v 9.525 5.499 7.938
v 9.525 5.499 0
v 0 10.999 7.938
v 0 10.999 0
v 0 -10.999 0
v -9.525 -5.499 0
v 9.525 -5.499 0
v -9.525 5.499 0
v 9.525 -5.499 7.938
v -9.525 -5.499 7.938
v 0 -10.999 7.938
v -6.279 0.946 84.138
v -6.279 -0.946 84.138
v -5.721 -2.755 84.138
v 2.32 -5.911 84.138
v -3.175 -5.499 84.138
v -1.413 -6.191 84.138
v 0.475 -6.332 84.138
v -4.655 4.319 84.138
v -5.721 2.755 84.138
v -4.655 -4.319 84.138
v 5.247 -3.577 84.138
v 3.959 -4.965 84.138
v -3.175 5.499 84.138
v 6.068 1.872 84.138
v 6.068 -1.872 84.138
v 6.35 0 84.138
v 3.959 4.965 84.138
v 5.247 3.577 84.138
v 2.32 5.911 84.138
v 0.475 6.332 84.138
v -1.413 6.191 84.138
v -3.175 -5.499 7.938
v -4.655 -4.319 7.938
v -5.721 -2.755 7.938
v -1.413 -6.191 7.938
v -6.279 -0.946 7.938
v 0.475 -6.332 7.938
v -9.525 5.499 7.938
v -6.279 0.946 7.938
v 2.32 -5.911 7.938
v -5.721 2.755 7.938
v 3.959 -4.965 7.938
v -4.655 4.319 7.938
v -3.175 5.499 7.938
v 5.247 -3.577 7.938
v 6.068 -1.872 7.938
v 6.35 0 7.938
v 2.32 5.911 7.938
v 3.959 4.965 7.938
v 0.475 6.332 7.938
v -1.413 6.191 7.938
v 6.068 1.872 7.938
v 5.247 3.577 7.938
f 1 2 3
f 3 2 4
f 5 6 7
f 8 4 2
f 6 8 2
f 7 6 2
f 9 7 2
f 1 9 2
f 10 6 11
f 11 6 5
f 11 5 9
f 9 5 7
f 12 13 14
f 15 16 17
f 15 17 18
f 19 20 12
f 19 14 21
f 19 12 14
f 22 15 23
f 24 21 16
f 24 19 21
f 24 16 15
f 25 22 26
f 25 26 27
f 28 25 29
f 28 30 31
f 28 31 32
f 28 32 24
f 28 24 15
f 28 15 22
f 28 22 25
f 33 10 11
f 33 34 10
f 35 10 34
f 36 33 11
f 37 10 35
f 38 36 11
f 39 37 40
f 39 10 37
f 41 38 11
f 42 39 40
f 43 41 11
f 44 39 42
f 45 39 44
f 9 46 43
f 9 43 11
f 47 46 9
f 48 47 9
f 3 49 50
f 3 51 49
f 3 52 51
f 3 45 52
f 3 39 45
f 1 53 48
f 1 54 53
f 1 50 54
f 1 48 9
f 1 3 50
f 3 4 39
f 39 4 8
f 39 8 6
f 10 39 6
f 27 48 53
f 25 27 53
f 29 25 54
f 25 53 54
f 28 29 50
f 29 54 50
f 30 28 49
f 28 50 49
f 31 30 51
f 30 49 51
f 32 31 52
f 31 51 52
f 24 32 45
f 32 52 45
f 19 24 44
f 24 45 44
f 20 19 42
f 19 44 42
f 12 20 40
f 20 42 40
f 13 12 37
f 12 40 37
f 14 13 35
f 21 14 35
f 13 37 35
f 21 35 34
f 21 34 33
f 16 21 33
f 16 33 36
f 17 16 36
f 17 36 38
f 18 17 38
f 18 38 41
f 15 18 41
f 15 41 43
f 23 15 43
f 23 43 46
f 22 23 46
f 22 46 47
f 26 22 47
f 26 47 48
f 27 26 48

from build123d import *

# Parameters (mm, degrees)
F1_R     = 6.35
F2_DEPTH = 7.9375
F3_DEPTH = 84.1375


# Not quite as in the source:
# - a variable given as a bare number and used for a length is read in inches; the dataset says mm whatever the document's units were


with BuildPart() as f2:
    # F1 (on Top) → F2 (new body)
    with BuildSketch(Plane.XY):
        Polygon((9.525, -5.499261314), (9.525, 5.499261314), (0, 10.9985226281), (-9.525, 5.499261314), (-9.525, -5.499261314), (0, -10.9985226281), align=None)
        Circle(F1_R, mode=Mode.SUBTRACT)
    extrude(amount=F2_DEPTH)

    # F1 (on Top) → F3 (join)
    with BuildSketch(Plane.XY):
        Circle(F1_R)
    extrude(amount=F3_DEPTH)


solid = f2.part
